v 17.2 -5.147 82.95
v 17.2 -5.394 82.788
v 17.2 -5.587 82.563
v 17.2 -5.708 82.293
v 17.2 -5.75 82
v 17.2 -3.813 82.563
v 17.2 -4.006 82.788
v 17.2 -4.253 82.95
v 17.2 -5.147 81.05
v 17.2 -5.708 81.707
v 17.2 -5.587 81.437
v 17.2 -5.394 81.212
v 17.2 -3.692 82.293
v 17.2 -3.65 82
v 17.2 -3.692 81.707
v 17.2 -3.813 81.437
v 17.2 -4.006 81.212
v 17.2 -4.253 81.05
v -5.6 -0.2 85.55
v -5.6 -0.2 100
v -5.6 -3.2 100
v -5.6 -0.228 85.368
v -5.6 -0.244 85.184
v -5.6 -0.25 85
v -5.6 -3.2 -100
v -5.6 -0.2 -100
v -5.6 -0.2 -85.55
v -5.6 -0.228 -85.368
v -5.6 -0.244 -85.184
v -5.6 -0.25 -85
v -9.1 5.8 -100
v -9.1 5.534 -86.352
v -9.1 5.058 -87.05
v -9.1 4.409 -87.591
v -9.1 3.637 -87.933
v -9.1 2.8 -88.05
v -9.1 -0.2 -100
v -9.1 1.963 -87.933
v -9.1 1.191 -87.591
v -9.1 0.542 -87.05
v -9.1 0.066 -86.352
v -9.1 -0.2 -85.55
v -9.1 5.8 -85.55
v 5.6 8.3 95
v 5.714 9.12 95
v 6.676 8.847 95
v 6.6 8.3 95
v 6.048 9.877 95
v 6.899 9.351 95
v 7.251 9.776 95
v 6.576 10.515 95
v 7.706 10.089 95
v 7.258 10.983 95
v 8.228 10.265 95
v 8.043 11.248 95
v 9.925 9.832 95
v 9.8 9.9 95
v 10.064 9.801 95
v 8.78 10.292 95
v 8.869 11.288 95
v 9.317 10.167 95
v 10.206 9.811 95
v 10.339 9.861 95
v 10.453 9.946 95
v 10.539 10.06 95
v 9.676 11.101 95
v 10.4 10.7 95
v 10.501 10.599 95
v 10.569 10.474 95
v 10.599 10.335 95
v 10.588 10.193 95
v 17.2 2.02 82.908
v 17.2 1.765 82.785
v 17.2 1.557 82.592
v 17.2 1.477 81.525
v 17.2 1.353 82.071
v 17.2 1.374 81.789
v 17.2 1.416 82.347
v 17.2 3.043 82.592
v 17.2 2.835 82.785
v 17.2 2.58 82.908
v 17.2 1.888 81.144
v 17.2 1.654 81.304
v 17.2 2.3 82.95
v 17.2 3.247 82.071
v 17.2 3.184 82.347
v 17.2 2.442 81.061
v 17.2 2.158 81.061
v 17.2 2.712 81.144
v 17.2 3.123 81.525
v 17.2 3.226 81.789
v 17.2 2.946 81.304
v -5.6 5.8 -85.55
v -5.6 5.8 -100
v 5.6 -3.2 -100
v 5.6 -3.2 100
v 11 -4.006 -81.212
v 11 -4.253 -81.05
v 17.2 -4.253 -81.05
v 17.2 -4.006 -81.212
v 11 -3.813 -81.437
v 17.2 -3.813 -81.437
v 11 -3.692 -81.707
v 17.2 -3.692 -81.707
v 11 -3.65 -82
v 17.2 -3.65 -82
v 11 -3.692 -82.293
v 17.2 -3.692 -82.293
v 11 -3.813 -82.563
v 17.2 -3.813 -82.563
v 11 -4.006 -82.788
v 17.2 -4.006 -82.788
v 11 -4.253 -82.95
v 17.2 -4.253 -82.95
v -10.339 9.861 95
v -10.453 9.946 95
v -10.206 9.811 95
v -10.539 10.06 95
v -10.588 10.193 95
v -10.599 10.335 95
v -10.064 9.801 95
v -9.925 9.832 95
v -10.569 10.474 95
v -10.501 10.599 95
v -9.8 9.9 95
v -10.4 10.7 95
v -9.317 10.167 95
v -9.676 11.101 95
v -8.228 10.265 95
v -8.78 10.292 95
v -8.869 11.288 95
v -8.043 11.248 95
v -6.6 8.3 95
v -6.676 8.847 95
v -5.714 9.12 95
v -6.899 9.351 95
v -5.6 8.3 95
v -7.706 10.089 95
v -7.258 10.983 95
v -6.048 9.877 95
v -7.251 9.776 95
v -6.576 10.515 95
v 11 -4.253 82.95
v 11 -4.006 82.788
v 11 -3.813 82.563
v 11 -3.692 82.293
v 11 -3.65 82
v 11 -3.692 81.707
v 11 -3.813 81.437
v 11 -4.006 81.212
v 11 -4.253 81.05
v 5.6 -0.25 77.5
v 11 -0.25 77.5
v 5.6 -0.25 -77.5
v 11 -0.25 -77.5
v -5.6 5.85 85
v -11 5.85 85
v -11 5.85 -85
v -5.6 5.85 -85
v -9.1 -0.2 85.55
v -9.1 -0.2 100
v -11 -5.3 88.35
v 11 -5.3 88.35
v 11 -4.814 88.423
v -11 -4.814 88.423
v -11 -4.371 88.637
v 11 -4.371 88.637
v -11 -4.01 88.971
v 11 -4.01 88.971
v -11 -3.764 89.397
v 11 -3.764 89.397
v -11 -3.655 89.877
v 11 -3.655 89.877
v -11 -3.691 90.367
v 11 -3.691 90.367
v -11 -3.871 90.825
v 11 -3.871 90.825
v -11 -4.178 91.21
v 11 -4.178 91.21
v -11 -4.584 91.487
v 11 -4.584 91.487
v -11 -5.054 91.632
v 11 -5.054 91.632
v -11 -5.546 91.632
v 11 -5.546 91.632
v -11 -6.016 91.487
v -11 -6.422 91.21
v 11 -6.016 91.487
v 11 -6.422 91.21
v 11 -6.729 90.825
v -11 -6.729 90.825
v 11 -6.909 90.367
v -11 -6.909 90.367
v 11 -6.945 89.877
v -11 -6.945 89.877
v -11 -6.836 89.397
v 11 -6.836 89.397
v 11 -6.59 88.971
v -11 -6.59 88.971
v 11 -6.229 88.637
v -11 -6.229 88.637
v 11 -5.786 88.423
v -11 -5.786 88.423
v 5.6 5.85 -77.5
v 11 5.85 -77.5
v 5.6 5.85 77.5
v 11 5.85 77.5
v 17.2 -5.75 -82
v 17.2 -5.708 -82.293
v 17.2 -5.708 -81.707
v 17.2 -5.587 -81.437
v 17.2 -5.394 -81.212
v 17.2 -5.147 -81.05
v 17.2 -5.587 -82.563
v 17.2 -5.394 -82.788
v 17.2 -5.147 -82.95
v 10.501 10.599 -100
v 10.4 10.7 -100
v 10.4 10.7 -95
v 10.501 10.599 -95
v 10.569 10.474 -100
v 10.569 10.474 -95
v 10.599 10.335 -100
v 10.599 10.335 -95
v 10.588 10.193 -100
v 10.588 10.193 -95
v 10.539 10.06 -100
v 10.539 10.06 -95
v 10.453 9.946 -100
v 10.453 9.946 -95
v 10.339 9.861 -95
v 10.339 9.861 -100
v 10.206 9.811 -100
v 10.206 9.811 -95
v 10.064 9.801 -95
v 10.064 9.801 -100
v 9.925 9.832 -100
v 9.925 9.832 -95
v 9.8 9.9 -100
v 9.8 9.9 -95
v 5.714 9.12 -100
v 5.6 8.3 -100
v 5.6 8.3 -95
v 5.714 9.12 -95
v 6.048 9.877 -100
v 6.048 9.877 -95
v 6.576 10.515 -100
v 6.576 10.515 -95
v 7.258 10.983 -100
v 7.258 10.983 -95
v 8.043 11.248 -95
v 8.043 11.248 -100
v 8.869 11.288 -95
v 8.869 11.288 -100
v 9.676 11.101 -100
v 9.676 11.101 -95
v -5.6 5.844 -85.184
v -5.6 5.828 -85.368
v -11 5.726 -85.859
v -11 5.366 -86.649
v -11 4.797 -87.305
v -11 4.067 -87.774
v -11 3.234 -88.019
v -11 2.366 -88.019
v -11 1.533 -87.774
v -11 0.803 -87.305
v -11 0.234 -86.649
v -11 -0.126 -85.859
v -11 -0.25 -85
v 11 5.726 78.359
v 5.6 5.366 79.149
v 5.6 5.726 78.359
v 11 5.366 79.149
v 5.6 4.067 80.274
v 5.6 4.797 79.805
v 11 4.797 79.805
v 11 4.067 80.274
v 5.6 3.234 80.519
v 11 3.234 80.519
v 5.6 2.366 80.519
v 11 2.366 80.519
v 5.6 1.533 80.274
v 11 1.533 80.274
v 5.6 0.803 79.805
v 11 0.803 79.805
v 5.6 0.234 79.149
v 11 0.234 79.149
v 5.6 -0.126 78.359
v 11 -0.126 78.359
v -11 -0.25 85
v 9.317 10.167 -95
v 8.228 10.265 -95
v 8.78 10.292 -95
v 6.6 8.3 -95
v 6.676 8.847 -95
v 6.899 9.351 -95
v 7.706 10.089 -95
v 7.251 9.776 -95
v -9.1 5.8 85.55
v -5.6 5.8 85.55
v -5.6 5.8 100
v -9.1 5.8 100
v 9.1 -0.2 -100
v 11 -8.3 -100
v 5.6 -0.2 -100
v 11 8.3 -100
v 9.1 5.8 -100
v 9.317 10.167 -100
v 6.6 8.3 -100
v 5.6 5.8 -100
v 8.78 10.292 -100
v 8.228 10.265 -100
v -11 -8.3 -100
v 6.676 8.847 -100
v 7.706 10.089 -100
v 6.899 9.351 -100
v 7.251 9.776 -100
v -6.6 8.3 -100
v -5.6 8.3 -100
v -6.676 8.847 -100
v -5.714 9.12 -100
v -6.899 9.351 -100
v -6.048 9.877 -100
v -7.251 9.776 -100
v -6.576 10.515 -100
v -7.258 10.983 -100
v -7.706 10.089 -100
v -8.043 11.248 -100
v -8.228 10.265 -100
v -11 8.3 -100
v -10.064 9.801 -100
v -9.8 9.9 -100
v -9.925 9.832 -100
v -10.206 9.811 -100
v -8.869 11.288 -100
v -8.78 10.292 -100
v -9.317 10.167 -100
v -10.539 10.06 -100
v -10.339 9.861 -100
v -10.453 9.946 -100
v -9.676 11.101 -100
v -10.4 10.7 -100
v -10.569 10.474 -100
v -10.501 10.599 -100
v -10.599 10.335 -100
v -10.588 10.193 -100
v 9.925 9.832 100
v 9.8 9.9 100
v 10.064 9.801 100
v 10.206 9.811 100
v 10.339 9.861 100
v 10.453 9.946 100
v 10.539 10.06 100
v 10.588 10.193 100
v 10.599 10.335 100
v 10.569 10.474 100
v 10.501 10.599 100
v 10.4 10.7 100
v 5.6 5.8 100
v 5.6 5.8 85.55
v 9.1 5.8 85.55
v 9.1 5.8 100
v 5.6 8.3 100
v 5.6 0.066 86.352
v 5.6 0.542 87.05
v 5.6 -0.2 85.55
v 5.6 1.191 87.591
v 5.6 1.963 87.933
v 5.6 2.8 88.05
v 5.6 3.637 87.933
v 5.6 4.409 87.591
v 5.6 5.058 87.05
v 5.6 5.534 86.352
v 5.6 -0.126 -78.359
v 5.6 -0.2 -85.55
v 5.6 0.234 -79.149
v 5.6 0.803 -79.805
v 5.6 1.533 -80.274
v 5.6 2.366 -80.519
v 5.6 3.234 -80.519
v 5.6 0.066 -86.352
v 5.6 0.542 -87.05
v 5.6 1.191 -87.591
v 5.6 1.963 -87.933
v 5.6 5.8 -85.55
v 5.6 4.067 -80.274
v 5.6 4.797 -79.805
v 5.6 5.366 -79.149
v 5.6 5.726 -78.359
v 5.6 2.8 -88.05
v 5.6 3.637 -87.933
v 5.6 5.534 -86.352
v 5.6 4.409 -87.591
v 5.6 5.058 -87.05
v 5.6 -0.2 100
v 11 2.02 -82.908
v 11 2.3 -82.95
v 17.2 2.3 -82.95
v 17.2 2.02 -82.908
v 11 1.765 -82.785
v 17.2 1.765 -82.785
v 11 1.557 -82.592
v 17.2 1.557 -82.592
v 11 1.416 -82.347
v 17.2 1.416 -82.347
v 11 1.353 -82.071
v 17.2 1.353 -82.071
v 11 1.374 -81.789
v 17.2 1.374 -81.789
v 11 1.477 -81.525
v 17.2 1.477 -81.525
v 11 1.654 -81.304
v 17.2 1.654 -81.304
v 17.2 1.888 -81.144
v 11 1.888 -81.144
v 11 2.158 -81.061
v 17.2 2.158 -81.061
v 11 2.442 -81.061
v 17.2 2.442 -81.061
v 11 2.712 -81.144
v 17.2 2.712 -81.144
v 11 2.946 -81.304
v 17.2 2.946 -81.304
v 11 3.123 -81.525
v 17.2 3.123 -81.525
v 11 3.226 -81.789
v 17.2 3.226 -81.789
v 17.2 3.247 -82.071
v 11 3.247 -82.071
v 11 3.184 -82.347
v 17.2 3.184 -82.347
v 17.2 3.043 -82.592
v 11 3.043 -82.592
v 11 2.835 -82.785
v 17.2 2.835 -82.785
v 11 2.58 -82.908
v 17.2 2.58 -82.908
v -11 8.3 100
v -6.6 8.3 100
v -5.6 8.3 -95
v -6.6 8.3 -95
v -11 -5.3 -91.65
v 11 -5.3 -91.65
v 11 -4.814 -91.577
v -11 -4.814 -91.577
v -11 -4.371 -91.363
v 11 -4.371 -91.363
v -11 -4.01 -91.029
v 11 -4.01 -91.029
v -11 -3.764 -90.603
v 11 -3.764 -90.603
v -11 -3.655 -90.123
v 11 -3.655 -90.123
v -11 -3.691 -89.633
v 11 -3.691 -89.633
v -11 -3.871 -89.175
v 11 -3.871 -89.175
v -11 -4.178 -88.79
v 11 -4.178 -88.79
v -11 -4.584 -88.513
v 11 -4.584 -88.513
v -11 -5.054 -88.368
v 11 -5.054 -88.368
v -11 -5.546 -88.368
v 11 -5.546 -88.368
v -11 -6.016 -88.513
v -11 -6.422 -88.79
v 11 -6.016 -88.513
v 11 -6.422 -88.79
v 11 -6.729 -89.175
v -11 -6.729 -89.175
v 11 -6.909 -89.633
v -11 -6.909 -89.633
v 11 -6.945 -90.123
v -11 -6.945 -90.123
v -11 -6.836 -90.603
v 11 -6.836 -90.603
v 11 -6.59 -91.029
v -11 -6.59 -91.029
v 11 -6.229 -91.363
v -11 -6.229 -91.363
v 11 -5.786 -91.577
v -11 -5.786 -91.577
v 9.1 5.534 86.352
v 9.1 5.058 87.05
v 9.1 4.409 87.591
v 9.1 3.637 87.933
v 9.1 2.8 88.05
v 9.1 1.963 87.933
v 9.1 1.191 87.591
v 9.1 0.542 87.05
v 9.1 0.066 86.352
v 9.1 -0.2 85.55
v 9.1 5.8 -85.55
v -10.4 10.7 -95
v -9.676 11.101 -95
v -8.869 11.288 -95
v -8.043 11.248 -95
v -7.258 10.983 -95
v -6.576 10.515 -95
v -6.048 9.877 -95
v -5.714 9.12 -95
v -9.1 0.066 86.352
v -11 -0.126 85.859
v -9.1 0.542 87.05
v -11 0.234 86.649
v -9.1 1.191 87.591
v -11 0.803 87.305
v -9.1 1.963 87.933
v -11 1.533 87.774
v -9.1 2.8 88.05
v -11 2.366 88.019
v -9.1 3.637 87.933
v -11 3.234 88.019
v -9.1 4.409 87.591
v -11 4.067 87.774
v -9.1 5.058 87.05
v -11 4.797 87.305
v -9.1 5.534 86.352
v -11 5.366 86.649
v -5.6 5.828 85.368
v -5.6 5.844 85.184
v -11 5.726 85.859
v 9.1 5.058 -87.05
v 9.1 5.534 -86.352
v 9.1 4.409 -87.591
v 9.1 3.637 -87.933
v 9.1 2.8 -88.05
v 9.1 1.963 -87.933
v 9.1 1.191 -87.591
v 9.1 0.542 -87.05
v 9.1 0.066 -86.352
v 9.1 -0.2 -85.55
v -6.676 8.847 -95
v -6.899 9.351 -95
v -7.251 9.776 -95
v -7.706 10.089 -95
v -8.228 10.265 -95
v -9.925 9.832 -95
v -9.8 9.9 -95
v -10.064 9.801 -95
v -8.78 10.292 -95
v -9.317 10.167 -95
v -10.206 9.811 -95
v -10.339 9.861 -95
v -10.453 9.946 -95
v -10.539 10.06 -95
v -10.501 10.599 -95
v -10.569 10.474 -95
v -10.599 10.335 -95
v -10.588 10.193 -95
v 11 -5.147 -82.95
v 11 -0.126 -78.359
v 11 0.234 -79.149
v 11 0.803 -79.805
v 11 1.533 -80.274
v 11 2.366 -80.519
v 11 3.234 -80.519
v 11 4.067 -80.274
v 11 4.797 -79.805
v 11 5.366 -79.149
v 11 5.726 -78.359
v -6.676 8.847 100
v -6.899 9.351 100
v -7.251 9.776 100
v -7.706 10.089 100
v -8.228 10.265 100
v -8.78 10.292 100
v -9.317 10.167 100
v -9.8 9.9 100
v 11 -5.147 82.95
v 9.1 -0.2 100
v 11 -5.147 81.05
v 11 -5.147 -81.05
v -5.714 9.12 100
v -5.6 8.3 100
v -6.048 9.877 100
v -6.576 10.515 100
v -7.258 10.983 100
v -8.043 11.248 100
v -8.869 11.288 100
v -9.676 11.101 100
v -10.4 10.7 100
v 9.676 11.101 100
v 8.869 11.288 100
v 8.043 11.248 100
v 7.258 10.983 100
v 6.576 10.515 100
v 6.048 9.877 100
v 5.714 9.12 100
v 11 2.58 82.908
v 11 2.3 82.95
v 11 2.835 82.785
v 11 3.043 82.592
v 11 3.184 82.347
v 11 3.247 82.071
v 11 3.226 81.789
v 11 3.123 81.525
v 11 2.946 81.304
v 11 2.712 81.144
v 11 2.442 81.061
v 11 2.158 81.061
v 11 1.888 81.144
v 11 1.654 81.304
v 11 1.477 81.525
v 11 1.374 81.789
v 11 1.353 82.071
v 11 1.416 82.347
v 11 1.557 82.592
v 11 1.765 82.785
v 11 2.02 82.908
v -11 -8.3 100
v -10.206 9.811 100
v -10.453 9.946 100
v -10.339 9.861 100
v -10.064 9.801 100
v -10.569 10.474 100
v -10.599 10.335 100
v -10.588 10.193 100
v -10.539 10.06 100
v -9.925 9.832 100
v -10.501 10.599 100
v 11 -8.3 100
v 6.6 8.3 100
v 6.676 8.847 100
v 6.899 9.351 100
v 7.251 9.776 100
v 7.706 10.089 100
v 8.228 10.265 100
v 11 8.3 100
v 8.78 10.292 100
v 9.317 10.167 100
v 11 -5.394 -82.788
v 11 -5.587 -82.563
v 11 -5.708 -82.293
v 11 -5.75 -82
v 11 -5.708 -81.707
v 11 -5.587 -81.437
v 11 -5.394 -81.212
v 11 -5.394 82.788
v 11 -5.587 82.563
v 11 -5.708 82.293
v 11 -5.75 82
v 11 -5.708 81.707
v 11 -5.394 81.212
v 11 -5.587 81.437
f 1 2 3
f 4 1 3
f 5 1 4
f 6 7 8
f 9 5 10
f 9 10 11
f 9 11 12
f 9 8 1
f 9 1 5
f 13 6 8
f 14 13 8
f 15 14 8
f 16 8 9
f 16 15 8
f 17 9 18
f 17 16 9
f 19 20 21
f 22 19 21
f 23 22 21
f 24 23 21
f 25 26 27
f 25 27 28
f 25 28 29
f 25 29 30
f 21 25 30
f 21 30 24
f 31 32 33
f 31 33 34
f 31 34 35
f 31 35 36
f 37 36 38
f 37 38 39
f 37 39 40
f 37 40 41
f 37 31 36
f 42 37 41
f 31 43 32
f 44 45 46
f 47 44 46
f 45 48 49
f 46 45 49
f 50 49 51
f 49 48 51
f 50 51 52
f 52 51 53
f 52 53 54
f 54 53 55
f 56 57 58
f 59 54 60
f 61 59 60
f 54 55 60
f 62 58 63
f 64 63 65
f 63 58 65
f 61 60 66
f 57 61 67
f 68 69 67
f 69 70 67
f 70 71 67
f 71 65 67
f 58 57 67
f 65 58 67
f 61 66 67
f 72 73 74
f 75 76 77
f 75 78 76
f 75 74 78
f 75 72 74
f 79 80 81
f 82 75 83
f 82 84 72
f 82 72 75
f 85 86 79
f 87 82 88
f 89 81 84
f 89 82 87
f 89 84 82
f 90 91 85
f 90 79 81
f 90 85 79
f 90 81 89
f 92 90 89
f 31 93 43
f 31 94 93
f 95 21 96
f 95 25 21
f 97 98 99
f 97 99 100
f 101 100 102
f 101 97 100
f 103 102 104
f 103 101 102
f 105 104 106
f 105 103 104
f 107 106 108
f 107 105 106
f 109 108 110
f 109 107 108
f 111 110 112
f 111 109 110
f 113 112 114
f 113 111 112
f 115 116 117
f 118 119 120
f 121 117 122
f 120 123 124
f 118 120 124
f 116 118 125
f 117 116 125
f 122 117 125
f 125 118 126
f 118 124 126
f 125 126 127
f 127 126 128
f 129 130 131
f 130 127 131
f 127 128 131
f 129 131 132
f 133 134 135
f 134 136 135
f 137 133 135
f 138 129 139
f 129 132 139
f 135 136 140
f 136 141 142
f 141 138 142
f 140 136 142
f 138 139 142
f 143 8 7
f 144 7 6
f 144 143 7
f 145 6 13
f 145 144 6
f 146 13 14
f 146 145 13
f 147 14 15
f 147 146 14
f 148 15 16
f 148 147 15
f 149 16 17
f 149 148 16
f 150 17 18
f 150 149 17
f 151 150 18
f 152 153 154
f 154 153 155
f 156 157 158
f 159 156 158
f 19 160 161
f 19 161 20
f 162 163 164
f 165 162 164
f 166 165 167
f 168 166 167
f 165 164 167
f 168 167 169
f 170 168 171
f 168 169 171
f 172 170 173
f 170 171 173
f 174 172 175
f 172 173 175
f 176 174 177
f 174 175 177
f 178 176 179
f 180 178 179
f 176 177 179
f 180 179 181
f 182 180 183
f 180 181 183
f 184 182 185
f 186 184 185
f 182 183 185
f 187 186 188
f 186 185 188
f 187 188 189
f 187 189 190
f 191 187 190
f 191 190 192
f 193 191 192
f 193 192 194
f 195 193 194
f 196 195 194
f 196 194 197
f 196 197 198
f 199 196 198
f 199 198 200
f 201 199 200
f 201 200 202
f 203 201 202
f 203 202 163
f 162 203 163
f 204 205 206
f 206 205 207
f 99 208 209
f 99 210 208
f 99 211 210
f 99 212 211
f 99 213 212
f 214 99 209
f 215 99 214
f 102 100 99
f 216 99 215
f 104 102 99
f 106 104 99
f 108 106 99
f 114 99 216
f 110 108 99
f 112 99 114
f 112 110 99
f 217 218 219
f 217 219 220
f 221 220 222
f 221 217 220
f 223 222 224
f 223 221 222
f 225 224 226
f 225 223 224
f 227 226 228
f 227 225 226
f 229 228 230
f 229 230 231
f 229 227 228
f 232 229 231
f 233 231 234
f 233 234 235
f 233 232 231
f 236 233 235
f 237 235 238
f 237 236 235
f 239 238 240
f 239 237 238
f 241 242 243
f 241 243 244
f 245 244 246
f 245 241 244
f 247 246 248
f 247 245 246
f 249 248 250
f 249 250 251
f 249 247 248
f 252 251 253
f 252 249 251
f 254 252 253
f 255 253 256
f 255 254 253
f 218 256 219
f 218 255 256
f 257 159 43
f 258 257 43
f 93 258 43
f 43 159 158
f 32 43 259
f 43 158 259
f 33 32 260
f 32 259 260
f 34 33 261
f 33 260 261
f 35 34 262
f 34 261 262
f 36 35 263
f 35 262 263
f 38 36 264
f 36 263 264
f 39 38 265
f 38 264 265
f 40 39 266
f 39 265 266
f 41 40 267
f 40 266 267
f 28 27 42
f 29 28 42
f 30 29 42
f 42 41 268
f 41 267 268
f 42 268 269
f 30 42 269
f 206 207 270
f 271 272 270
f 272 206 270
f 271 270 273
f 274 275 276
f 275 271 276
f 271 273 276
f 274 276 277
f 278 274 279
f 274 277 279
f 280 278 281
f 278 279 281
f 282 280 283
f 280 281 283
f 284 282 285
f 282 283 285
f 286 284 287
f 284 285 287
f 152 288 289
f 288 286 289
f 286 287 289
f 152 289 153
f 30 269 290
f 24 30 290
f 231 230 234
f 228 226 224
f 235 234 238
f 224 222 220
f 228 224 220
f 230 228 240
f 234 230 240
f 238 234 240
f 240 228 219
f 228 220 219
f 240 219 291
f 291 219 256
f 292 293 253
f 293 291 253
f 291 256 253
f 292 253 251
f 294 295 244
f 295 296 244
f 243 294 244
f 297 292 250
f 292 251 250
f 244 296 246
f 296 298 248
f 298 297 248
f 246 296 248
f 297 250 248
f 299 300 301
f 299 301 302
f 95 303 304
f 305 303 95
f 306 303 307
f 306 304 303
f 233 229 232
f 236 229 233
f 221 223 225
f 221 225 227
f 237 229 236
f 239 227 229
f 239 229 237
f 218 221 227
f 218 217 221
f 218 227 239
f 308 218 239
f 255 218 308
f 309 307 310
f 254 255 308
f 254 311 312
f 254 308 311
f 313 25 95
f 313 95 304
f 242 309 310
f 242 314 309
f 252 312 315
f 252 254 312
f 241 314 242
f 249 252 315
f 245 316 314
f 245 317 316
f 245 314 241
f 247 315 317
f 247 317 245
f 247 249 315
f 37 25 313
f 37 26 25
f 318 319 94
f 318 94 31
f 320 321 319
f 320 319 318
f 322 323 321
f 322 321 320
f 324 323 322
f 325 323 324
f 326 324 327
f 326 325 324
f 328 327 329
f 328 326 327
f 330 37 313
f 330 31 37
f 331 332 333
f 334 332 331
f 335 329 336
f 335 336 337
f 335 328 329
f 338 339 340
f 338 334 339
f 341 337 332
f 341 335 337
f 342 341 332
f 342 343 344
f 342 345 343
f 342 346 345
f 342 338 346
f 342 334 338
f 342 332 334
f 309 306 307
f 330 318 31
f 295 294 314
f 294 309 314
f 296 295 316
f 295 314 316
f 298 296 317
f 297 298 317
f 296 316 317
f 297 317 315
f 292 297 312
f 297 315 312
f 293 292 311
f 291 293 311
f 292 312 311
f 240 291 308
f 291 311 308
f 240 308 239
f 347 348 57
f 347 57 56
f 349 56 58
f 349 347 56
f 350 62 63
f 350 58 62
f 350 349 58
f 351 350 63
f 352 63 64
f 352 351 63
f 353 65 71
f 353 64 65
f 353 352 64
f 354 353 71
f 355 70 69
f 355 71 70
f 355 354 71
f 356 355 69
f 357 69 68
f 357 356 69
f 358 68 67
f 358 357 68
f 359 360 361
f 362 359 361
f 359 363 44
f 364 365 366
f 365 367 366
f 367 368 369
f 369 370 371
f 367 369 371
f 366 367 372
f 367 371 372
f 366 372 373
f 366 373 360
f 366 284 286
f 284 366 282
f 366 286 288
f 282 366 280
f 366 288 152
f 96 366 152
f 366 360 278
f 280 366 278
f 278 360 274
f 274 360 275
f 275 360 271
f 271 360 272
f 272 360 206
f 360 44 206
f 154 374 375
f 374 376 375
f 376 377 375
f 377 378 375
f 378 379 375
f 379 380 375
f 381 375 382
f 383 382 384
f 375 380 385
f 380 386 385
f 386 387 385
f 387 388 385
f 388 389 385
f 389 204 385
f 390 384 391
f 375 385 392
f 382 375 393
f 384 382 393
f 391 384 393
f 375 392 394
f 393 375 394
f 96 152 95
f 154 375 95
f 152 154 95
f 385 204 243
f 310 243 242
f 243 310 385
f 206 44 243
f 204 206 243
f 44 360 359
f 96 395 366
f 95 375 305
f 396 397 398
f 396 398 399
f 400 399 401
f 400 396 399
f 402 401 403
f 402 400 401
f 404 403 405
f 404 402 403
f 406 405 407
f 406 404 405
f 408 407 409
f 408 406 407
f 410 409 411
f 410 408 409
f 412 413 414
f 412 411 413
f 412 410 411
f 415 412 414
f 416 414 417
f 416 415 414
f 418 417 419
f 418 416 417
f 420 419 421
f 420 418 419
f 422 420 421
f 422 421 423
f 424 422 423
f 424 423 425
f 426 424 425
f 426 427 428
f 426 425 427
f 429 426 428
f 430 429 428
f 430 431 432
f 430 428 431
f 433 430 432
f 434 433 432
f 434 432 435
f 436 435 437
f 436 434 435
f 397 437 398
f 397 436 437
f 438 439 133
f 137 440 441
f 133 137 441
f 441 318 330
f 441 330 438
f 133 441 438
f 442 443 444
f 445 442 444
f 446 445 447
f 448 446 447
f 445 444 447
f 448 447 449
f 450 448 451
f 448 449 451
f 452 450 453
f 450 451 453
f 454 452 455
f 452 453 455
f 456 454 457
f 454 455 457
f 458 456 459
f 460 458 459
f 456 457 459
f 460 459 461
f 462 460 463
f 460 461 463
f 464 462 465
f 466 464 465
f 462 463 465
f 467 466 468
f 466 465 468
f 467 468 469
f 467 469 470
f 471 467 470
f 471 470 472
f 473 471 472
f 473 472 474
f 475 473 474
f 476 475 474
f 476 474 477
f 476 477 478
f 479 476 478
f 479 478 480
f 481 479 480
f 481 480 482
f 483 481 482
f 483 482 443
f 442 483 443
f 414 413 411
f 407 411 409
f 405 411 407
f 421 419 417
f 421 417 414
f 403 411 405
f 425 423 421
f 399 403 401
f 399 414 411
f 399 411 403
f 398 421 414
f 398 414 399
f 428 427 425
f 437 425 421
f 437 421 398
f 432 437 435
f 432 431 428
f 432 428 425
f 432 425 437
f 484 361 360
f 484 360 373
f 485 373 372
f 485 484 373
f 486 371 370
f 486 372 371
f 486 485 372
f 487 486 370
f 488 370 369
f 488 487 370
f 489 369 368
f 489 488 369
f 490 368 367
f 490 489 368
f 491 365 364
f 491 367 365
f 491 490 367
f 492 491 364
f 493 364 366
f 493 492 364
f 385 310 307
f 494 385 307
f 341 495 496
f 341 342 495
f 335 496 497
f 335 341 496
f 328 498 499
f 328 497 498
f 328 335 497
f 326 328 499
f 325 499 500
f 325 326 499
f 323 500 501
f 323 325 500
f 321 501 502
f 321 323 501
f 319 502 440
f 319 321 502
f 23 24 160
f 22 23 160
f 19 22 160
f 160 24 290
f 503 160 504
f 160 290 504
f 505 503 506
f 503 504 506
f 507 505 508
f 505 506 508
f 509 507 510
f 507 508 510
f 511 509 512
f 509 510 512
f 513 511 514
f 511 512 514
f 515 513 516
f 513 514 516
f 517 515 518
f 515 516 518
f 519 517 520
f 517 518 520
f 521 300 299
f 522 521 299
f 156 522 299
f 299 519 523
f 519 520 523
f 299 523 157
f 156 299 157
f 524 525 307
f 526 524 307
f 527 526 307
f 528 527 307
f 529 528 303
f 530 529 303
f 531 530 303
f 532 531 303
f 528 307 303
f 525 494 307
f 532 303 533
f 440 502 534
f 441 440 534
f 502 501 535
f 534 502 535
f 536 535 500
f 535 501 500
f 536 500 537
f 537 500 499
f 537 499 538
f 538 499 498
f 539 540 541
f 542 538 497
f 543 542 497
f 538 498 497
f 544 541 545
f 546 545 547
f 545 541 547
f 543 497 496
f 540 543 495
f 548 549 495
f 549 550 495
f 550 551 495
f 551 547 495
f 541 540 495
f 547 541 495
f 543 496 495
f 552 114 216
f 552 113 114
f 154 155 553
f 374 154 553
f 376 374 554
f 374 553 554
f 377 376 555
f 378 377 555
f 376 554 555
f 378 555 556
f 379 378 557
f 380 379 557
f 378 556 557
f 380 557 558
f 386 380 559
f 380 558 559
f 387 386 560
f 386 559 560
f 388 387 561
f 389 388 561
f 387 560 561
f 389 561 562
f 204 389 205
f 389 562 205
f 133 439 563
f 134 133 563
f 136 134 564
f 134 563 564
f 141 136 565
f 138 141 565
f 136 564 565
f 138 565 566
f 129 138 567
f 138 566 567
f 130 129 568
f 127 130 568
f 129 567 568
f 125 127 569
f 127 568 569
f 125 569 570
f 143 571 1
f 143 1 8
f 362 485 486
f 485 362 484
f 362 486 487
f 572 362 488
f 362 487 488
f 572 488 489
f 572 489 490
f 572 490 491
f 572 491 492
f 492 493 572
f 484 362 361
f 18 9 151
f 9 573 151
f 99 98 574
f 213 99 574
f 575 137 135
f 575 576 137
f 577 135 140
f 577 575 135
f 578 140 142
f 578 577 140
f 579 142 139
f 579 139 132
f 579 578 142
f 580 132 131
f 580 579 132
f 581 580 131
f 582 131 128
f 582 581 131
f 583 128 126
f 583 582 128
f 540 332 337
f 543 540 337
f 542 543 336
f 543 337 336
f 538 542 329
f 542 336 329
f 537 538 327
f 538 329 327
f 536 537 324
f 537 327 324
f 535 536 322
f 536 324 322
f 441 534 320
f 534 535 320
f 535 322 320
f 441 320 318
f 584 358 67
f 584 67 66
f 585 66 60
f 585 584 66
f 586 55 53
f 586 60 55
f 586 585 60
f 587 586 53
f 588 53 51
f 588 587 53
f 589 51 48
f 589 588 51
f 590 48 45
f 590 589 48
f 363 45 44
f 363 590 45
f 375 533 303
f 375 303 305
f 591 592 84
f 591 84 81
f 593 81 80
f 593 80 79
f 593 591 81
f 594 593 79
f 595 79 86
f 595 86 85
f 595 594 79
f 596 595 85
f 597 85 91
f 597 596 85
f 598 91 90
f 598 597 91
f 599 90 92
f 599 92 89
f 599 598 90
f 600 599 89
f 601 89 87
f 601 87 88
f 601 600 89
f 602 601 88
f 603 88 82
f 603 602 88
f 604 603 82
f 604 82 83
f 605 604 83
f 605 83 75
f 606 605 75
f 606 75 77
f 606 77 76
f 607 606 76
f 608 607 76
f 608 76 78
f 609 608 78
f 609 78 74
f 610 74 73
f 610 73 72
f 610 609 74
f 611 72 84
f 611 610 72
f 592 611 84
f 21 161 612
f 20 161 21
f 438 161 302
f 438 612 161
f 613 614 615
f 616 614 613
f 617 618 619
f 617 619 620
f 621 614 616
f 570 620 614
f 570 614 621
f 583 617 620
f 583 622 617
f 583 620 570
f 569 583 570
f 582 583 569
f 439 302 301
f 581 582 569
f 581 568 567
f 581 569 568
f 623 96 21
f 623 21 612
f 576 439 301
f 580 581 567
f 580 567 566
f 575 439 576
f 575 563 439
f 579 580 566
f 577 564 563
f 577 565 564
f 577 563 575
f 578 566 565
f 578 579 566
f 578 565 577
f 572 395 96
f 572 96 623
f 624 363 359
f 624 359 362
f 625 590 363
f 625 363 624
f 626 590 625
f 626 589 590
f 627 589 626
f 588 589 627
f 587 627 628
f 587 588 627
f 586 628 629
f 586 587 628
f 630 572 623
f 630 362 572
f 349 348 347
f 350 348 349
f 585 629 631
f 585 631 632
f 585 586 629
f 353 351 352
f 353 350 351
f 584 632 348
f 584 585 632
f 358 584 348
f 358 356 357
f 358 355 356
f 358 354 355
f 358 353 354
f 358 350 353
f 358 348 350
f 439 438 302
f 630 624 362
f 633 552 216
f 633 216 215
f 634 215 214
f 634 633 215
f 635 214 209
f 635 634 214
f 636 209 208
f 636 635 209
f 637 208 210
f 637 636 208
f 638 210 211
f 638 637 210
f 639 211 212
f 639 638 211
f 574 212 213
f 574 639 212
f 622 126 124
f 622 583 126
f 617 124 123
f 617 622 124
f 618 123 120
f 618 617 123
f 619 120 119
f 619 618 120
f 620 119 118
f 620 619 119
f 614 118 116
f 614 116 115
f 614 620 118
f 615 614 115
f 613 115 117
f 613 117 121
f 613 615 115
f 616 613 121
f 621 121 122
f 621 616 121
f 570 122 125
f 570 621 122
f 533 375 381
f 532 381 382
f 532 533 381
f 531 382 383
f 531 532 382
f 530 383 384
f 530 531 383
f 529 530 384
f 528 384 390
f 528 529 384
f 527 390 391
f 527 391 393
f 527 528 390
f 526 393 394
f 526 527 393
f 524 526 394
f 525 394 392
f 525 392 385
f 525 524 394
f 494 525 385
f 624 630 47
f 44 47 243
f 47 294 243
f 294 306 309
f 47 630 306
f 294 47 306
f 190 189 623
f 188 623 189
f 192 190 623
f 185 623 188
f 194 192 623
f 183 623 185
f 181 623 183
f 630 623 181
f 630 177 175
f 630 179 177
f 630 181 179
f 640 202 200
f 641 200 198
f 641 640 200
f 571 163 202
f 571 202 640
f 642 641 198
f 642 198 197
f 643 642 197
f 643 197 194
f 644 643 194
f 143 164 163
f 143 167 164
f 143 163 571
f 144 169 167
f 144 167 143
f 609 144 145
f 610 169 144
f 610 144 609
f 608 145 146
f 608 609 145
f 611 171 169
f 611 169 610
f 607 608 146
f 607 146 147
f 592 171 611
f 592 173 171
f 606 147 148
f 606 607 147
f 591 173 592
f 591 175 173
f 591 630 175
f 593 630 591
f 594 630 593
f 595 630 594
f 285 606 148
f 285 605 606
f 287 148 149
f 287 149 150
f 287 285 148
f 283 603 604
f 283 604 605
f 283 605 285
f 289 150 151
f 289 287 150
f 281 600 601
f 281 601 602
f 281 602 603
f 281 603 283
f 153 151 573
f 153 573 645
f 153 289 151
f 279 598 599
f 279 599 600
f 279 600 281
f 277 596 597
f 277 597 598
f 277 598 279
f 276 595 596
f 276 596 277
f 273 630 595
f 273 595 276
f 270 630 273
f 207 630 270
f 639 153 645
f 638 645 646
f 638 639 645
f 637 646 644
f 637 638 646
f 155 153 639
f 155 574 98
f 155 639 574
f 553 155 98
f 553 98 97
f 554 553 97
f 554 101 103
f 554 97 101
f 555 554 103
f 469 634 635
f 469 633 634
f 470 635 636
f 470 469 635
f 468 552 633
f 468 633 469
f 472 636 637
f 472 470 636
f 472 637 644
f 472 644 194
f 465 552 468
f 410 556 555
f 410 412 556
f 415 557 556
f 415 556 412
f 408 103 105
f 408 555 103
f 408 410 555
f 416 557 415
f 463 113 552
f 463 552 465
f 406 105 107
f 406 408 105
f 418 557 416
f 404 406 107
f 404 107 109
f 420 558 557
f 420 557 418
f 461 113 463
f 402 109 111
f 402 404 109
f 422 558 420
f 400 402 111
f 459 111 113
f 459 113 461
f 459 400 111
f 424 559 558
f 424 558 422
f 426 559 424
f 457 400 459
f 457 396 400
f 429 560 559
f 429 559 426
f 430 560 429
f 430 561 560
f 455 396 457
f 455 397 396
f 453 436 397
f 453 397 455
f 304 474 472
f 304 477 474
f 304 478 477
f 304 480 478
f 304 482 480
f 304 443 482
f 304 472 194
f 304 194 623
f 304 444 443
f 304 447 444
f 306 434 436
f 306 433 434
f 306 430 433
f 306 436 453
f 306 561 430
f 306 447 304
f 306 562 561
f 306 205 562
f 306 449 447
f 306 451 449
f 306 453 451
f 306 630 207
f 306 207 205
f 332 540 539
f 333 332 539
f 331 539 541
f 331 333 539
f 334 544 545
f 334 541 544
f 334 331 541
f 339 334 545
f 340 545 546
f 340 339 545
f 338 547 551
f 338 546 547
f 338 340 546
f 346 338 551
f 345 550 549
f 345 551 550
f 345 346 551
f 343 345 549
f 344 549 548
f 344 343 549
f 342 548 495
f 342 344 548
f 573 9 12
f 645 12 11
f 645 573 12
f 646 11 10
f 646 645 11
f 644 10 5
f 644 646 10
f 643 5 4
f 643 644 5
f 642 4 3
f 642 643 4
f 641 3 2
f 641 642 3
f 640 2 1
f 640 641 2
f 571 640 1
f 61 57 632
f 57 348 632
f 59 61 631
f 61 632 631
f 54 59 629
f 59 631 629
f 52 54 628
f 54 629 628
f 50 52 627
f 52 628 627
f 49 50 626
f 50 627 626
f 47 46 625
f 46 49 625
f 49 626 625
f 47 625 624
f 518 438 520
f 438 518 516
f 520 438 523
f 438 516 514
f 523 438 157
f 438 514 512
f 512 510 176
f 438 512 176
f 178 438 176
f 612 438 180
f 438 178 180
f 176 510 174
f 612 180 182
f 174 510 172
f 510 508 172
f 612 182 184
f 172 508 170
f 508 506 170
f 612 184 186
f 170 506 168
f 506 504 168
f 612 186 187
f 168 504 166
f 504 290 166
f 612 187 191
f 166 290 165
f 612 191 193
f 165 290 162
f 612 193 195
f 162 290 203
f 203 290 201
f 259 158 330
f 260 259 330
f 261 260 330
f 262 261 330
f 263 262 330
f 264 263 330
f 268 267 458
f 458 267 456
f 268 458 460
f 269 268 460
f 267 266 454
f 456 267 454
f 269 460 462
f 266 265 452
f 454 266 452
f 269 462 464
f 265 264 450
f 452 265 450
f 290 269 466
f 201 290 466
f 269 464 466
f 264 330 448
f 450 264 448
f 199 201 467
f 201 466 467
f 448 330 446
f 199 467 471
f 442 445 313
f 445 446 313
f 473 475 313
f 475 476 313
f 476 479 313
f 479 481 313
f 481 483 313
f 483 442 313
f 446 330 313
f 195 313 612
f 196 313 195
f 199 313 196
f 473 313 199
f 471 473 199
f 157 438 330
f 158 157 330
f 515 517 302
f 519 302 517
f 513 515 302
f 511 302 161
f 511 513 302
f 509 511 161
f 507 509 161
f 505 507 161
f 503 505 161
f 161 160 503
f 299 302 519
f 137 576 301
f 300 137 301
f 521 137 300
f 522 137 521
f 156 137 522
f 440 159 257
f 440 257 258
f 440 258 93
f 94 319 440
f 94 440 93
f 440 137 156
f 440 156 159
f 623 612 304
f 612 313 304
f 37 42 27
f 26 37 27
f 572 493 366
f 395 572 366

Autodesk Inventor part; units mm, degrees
ref_plane "YZ Plane" through (0, 0, 0) normal (1, 0, 0) x (0, 1, 0)
ref_plane "XZ Plane" through (0, 0, 0) normal (0, 1, 0) x (-1, 0, 0)
ref_plane "XY Plane" through (0, 0, 0) normal (0, 0, 1) x (1, 0, 0)
sketch "Sketch1" plane through (0, 0, 0) normal (0, 0, 1) x (1, 0, 0)
  line L0 (-11, -8.3) -> (11, -8.3)
  line L1 (11, -8.3) -> (11, 8.3)
  line L2 (11, 8.3) -> (-11, 8.3)
  line L3 (-11, 8.3) -> (-11, -8.3)
  line L4 (-11, -8.3) -> (11, 8.3) construction
  line L5 (11, -8.3) -> (-11, 8.3) construction
  line L6 (-5.6, 8.3) -> (-5.6, 5.8)
  line L7 (-5.6, 5.8) -> (-9.1, 5.8)
  line L8 (-9.1, 5.8) -> (-9.1, -0.2)
  line L9 (-9.1, -0.2) -> (-5.6, -0.2)
  line L10 (-5.6, -0.2) -> (-5.6, -3.2)
  line L11 (-5.6, -3.2) -> (0, -3.2)
  line L12 (0, 8.3) -> (0, -8.3) construction
  line L13 (5.6, 8.3) -> (5.6, 5.8)
  line L14 (5.6, 5.8) -> (9.1, 5.8)
  line L15 (9.1, 5.8) -> (9.1, -0.2)
  line L16 (9.1, -0.2) -> (5.6, -0.2)
  line L17 (5.6, -0.2) -> (5.6, -3.2)
  line L18 (5.6, -3.2) -> (0, -3.2)
  point P0 (0, 0)
  point P1 (-5.6, 7.05)
  point P2 (-5.6, -1.7)
  point P3 (5.6, 8.3)
  dimension "d0" = 22
  dimension "d1" = 16.6
  dimension "d3" = 5.6
  dimension "d4" = 2.5
  dimension "d5" = 6
  dimension "d6" = 3
  dimension "d7" = 3.5
  dimension "d36" = 18.2
extrude "Extrusion1" add sketch "Sketch1" along normal mid plane 200 contours L3 L2 L6 L7 L8 L9 L10 L11 L18 L17 L16 L15 L14 L13 L1 L0
sketch "Sketch2" plane through (11, -8.3, 100) normal (1, 0, 0) x (0, 0, -1)
  line L0 (200, 16.6) -> (200, 0) projected
  line L1 (200, 0) -> (0, 0) projected
  circle A0 centre (190, 3) radius 1.65
  line L2 (0, 0) -> (0, 16.6) projected
  line L3 (200, 16.6) -> (0, 16.6) projected
  line L4 (100, 16.6) -> (100, 0)
  circle A1 centre (10, 3) radius 1.65
  point P0 (100, 8.3)
  dimension "d13" = 3.3
  dimension "d18" = 180
  dimension "d19" = 3
extrude "Extrusion2" cut sketch "Sketch2" against normal blind 180 contours A0 | A1
sketch "Sketch5" plane through (-11, -8.3, 100) normal (-1, 0, 0) x (0, 0, 1)
  line L0 (-185, 11.1) -> (-15, 11.1) construction
  line L1 (-185, 8.05) -> (-15, 8.05)
  line L2 (-15, 14.15) -> (-185, 14.15)
  arc A0 (-185, 14.15) -> (-185, 8.05) centre (-185, 11.1) ccw
  arc A1 (-15, 8.05) -> (-15, 14.15) centre (-15, 11.1) ccw
  line L3 (-200, 14.1) -> (-200, 8.1) projected
  line L4 (-200, 0) -> (0, 0) projected
  line L5 (-200, 16.6) -> (0, 16.6) projected
  line L6 (-100, 16.6) -> (-100, 8.05)
  point P0 (-100, 8.3)
  point P1 (-100, 11.1)
  point P2 (-200, 11.1)
  point P3 (-100, 0)
  dimension "d23" = 85
  dimension "d24" = 6.1
extrude "Extrusion4" cut sketch "Sketch5" against normal up to next
sketch "Sketch6" plane through (0, 0, 100) normal (0, 0, 1) x (1, 0, 0)
  line L0 (-11, 8.3) -> (-5.6, 8.3) projected
  arc A0 (-6.6, 8.3) -> (-9.8, 9.9) centre (-8.6, 8.3) ccw
  line L1 (-5.6, 8.3) -> (-11, 8.3) projected
  arc A1 (-5.6, 8.3) -> (-10.4, 10.7) centre (-8.6, 8.3) ccw
  arc A2 (-10.4, 10.7) -> (-9.8, 9.9) centre (-10.1, 10.3) ccw
  line L2 (-11, 8.3) -> (-11, -8.3) projected
  point P0 (0, 0)
  point P1 (-6.5, 8.3)
  dimension "d29" = 2
  dimension "d31" = 1
  dimension "d32" = 2
extrude "Extrusion5" add sketch "Sketch6" against normal blind 5
mirror "Mirror1" about plane through (0, 0, 0) normal (1, 0, 0) of "Extrusion5"
mirror "Mirror2" about plane through (0, 0, 0) normal (0, 0, 1) of "Extrusion5", "Mirror1"
mirror "Mirror3" about plane through (0, 0, 0) normal (1, 0, 0) of "Extrusion4"
sketch "Sketch7" plane through (11, -8.3, 100) normal (1, 0, 0) x (0, 0, -1)
  line L0 (170, 11.1) -> (185, 11.1) construction
  line L1 (170, 8.05) -> (185, 8.05)
  line L2 (185, 14.15) -> (170, 14.15)
  arc A0 (170, 14.15) -> (170, 8.05) centre (170, 11.1) ccw
  arc A1 (185, 8.05) -> (185, 14.15) centre (185, 11.1) ccw
  arc A2 (185, 8.05) -> (185, 14.15) centre (185, 11.1) ccw projected
  arc A3 (177.5, 8.05) -> (177.5, 14.15) centre (177.5, 11.1) ccw
  point P0 (100, 8.3)
  dimension "d37" = 15
extrude "Extrusion6" add sketch "Sketch7" against normal up to surface (5.4 mm away) contours A3 L2 A1 L1
sketch "Sketch8" plane through (11, -8.3, 100) normal (1, 0, 0) x (0, 0, -1)
  circle A0 centre (182, 10.6) radius 0.95
  circle A1 centre (182, 3.6) radius 1.05
  line L0 (181.05, 4.0472) -> (181.05, 3.1528)
  line L1 (182, 4.65) -> (182, 2.55)
  line L2 (182.95, 4.0472) -> (182.95, 3.1528)
  line L3 (0, 16.6) -> (200, 16.6) projected
  line L4 (200, 16.6) -> (200, 0) projected
  point P0 (100, 8.3)
  point P1 (182.95, 3.1528)
  point P2 (182.95, 4.0472)
  dimension "d40" = 1.9
  dimension "d41" = 2.1
  dimension "d42" = 1.9
  dimension "d43" = 7
  dimension "d44" = 6
  dimension "d45" = 18
extrude "Extrusion7" add sketch "Sketch8" along normal blind 6.2 contours A0 | L2 A1 L1 | L1 A1 L0
mirror "Mirror4" about plane through (0, 0, 0) normal (0, 0, 1) of "Extrusion6", "Extrusion7"
ref_plane "Work Plane1" through (0, 0, 0) normal (1, 0, 0) x (0, 1, 0)
ref_plane "Work Plane2" through (0, 0, 0) normal (-1, 0, 0) x (0, 1, 0)
ref_plane "Work Plane3" through (0, 0, 0) normal (-1, 0, 0) x (0, 1, 0)
equation "\"d15\" = d18"
properties part number "Rack ( Female Fixation )"
